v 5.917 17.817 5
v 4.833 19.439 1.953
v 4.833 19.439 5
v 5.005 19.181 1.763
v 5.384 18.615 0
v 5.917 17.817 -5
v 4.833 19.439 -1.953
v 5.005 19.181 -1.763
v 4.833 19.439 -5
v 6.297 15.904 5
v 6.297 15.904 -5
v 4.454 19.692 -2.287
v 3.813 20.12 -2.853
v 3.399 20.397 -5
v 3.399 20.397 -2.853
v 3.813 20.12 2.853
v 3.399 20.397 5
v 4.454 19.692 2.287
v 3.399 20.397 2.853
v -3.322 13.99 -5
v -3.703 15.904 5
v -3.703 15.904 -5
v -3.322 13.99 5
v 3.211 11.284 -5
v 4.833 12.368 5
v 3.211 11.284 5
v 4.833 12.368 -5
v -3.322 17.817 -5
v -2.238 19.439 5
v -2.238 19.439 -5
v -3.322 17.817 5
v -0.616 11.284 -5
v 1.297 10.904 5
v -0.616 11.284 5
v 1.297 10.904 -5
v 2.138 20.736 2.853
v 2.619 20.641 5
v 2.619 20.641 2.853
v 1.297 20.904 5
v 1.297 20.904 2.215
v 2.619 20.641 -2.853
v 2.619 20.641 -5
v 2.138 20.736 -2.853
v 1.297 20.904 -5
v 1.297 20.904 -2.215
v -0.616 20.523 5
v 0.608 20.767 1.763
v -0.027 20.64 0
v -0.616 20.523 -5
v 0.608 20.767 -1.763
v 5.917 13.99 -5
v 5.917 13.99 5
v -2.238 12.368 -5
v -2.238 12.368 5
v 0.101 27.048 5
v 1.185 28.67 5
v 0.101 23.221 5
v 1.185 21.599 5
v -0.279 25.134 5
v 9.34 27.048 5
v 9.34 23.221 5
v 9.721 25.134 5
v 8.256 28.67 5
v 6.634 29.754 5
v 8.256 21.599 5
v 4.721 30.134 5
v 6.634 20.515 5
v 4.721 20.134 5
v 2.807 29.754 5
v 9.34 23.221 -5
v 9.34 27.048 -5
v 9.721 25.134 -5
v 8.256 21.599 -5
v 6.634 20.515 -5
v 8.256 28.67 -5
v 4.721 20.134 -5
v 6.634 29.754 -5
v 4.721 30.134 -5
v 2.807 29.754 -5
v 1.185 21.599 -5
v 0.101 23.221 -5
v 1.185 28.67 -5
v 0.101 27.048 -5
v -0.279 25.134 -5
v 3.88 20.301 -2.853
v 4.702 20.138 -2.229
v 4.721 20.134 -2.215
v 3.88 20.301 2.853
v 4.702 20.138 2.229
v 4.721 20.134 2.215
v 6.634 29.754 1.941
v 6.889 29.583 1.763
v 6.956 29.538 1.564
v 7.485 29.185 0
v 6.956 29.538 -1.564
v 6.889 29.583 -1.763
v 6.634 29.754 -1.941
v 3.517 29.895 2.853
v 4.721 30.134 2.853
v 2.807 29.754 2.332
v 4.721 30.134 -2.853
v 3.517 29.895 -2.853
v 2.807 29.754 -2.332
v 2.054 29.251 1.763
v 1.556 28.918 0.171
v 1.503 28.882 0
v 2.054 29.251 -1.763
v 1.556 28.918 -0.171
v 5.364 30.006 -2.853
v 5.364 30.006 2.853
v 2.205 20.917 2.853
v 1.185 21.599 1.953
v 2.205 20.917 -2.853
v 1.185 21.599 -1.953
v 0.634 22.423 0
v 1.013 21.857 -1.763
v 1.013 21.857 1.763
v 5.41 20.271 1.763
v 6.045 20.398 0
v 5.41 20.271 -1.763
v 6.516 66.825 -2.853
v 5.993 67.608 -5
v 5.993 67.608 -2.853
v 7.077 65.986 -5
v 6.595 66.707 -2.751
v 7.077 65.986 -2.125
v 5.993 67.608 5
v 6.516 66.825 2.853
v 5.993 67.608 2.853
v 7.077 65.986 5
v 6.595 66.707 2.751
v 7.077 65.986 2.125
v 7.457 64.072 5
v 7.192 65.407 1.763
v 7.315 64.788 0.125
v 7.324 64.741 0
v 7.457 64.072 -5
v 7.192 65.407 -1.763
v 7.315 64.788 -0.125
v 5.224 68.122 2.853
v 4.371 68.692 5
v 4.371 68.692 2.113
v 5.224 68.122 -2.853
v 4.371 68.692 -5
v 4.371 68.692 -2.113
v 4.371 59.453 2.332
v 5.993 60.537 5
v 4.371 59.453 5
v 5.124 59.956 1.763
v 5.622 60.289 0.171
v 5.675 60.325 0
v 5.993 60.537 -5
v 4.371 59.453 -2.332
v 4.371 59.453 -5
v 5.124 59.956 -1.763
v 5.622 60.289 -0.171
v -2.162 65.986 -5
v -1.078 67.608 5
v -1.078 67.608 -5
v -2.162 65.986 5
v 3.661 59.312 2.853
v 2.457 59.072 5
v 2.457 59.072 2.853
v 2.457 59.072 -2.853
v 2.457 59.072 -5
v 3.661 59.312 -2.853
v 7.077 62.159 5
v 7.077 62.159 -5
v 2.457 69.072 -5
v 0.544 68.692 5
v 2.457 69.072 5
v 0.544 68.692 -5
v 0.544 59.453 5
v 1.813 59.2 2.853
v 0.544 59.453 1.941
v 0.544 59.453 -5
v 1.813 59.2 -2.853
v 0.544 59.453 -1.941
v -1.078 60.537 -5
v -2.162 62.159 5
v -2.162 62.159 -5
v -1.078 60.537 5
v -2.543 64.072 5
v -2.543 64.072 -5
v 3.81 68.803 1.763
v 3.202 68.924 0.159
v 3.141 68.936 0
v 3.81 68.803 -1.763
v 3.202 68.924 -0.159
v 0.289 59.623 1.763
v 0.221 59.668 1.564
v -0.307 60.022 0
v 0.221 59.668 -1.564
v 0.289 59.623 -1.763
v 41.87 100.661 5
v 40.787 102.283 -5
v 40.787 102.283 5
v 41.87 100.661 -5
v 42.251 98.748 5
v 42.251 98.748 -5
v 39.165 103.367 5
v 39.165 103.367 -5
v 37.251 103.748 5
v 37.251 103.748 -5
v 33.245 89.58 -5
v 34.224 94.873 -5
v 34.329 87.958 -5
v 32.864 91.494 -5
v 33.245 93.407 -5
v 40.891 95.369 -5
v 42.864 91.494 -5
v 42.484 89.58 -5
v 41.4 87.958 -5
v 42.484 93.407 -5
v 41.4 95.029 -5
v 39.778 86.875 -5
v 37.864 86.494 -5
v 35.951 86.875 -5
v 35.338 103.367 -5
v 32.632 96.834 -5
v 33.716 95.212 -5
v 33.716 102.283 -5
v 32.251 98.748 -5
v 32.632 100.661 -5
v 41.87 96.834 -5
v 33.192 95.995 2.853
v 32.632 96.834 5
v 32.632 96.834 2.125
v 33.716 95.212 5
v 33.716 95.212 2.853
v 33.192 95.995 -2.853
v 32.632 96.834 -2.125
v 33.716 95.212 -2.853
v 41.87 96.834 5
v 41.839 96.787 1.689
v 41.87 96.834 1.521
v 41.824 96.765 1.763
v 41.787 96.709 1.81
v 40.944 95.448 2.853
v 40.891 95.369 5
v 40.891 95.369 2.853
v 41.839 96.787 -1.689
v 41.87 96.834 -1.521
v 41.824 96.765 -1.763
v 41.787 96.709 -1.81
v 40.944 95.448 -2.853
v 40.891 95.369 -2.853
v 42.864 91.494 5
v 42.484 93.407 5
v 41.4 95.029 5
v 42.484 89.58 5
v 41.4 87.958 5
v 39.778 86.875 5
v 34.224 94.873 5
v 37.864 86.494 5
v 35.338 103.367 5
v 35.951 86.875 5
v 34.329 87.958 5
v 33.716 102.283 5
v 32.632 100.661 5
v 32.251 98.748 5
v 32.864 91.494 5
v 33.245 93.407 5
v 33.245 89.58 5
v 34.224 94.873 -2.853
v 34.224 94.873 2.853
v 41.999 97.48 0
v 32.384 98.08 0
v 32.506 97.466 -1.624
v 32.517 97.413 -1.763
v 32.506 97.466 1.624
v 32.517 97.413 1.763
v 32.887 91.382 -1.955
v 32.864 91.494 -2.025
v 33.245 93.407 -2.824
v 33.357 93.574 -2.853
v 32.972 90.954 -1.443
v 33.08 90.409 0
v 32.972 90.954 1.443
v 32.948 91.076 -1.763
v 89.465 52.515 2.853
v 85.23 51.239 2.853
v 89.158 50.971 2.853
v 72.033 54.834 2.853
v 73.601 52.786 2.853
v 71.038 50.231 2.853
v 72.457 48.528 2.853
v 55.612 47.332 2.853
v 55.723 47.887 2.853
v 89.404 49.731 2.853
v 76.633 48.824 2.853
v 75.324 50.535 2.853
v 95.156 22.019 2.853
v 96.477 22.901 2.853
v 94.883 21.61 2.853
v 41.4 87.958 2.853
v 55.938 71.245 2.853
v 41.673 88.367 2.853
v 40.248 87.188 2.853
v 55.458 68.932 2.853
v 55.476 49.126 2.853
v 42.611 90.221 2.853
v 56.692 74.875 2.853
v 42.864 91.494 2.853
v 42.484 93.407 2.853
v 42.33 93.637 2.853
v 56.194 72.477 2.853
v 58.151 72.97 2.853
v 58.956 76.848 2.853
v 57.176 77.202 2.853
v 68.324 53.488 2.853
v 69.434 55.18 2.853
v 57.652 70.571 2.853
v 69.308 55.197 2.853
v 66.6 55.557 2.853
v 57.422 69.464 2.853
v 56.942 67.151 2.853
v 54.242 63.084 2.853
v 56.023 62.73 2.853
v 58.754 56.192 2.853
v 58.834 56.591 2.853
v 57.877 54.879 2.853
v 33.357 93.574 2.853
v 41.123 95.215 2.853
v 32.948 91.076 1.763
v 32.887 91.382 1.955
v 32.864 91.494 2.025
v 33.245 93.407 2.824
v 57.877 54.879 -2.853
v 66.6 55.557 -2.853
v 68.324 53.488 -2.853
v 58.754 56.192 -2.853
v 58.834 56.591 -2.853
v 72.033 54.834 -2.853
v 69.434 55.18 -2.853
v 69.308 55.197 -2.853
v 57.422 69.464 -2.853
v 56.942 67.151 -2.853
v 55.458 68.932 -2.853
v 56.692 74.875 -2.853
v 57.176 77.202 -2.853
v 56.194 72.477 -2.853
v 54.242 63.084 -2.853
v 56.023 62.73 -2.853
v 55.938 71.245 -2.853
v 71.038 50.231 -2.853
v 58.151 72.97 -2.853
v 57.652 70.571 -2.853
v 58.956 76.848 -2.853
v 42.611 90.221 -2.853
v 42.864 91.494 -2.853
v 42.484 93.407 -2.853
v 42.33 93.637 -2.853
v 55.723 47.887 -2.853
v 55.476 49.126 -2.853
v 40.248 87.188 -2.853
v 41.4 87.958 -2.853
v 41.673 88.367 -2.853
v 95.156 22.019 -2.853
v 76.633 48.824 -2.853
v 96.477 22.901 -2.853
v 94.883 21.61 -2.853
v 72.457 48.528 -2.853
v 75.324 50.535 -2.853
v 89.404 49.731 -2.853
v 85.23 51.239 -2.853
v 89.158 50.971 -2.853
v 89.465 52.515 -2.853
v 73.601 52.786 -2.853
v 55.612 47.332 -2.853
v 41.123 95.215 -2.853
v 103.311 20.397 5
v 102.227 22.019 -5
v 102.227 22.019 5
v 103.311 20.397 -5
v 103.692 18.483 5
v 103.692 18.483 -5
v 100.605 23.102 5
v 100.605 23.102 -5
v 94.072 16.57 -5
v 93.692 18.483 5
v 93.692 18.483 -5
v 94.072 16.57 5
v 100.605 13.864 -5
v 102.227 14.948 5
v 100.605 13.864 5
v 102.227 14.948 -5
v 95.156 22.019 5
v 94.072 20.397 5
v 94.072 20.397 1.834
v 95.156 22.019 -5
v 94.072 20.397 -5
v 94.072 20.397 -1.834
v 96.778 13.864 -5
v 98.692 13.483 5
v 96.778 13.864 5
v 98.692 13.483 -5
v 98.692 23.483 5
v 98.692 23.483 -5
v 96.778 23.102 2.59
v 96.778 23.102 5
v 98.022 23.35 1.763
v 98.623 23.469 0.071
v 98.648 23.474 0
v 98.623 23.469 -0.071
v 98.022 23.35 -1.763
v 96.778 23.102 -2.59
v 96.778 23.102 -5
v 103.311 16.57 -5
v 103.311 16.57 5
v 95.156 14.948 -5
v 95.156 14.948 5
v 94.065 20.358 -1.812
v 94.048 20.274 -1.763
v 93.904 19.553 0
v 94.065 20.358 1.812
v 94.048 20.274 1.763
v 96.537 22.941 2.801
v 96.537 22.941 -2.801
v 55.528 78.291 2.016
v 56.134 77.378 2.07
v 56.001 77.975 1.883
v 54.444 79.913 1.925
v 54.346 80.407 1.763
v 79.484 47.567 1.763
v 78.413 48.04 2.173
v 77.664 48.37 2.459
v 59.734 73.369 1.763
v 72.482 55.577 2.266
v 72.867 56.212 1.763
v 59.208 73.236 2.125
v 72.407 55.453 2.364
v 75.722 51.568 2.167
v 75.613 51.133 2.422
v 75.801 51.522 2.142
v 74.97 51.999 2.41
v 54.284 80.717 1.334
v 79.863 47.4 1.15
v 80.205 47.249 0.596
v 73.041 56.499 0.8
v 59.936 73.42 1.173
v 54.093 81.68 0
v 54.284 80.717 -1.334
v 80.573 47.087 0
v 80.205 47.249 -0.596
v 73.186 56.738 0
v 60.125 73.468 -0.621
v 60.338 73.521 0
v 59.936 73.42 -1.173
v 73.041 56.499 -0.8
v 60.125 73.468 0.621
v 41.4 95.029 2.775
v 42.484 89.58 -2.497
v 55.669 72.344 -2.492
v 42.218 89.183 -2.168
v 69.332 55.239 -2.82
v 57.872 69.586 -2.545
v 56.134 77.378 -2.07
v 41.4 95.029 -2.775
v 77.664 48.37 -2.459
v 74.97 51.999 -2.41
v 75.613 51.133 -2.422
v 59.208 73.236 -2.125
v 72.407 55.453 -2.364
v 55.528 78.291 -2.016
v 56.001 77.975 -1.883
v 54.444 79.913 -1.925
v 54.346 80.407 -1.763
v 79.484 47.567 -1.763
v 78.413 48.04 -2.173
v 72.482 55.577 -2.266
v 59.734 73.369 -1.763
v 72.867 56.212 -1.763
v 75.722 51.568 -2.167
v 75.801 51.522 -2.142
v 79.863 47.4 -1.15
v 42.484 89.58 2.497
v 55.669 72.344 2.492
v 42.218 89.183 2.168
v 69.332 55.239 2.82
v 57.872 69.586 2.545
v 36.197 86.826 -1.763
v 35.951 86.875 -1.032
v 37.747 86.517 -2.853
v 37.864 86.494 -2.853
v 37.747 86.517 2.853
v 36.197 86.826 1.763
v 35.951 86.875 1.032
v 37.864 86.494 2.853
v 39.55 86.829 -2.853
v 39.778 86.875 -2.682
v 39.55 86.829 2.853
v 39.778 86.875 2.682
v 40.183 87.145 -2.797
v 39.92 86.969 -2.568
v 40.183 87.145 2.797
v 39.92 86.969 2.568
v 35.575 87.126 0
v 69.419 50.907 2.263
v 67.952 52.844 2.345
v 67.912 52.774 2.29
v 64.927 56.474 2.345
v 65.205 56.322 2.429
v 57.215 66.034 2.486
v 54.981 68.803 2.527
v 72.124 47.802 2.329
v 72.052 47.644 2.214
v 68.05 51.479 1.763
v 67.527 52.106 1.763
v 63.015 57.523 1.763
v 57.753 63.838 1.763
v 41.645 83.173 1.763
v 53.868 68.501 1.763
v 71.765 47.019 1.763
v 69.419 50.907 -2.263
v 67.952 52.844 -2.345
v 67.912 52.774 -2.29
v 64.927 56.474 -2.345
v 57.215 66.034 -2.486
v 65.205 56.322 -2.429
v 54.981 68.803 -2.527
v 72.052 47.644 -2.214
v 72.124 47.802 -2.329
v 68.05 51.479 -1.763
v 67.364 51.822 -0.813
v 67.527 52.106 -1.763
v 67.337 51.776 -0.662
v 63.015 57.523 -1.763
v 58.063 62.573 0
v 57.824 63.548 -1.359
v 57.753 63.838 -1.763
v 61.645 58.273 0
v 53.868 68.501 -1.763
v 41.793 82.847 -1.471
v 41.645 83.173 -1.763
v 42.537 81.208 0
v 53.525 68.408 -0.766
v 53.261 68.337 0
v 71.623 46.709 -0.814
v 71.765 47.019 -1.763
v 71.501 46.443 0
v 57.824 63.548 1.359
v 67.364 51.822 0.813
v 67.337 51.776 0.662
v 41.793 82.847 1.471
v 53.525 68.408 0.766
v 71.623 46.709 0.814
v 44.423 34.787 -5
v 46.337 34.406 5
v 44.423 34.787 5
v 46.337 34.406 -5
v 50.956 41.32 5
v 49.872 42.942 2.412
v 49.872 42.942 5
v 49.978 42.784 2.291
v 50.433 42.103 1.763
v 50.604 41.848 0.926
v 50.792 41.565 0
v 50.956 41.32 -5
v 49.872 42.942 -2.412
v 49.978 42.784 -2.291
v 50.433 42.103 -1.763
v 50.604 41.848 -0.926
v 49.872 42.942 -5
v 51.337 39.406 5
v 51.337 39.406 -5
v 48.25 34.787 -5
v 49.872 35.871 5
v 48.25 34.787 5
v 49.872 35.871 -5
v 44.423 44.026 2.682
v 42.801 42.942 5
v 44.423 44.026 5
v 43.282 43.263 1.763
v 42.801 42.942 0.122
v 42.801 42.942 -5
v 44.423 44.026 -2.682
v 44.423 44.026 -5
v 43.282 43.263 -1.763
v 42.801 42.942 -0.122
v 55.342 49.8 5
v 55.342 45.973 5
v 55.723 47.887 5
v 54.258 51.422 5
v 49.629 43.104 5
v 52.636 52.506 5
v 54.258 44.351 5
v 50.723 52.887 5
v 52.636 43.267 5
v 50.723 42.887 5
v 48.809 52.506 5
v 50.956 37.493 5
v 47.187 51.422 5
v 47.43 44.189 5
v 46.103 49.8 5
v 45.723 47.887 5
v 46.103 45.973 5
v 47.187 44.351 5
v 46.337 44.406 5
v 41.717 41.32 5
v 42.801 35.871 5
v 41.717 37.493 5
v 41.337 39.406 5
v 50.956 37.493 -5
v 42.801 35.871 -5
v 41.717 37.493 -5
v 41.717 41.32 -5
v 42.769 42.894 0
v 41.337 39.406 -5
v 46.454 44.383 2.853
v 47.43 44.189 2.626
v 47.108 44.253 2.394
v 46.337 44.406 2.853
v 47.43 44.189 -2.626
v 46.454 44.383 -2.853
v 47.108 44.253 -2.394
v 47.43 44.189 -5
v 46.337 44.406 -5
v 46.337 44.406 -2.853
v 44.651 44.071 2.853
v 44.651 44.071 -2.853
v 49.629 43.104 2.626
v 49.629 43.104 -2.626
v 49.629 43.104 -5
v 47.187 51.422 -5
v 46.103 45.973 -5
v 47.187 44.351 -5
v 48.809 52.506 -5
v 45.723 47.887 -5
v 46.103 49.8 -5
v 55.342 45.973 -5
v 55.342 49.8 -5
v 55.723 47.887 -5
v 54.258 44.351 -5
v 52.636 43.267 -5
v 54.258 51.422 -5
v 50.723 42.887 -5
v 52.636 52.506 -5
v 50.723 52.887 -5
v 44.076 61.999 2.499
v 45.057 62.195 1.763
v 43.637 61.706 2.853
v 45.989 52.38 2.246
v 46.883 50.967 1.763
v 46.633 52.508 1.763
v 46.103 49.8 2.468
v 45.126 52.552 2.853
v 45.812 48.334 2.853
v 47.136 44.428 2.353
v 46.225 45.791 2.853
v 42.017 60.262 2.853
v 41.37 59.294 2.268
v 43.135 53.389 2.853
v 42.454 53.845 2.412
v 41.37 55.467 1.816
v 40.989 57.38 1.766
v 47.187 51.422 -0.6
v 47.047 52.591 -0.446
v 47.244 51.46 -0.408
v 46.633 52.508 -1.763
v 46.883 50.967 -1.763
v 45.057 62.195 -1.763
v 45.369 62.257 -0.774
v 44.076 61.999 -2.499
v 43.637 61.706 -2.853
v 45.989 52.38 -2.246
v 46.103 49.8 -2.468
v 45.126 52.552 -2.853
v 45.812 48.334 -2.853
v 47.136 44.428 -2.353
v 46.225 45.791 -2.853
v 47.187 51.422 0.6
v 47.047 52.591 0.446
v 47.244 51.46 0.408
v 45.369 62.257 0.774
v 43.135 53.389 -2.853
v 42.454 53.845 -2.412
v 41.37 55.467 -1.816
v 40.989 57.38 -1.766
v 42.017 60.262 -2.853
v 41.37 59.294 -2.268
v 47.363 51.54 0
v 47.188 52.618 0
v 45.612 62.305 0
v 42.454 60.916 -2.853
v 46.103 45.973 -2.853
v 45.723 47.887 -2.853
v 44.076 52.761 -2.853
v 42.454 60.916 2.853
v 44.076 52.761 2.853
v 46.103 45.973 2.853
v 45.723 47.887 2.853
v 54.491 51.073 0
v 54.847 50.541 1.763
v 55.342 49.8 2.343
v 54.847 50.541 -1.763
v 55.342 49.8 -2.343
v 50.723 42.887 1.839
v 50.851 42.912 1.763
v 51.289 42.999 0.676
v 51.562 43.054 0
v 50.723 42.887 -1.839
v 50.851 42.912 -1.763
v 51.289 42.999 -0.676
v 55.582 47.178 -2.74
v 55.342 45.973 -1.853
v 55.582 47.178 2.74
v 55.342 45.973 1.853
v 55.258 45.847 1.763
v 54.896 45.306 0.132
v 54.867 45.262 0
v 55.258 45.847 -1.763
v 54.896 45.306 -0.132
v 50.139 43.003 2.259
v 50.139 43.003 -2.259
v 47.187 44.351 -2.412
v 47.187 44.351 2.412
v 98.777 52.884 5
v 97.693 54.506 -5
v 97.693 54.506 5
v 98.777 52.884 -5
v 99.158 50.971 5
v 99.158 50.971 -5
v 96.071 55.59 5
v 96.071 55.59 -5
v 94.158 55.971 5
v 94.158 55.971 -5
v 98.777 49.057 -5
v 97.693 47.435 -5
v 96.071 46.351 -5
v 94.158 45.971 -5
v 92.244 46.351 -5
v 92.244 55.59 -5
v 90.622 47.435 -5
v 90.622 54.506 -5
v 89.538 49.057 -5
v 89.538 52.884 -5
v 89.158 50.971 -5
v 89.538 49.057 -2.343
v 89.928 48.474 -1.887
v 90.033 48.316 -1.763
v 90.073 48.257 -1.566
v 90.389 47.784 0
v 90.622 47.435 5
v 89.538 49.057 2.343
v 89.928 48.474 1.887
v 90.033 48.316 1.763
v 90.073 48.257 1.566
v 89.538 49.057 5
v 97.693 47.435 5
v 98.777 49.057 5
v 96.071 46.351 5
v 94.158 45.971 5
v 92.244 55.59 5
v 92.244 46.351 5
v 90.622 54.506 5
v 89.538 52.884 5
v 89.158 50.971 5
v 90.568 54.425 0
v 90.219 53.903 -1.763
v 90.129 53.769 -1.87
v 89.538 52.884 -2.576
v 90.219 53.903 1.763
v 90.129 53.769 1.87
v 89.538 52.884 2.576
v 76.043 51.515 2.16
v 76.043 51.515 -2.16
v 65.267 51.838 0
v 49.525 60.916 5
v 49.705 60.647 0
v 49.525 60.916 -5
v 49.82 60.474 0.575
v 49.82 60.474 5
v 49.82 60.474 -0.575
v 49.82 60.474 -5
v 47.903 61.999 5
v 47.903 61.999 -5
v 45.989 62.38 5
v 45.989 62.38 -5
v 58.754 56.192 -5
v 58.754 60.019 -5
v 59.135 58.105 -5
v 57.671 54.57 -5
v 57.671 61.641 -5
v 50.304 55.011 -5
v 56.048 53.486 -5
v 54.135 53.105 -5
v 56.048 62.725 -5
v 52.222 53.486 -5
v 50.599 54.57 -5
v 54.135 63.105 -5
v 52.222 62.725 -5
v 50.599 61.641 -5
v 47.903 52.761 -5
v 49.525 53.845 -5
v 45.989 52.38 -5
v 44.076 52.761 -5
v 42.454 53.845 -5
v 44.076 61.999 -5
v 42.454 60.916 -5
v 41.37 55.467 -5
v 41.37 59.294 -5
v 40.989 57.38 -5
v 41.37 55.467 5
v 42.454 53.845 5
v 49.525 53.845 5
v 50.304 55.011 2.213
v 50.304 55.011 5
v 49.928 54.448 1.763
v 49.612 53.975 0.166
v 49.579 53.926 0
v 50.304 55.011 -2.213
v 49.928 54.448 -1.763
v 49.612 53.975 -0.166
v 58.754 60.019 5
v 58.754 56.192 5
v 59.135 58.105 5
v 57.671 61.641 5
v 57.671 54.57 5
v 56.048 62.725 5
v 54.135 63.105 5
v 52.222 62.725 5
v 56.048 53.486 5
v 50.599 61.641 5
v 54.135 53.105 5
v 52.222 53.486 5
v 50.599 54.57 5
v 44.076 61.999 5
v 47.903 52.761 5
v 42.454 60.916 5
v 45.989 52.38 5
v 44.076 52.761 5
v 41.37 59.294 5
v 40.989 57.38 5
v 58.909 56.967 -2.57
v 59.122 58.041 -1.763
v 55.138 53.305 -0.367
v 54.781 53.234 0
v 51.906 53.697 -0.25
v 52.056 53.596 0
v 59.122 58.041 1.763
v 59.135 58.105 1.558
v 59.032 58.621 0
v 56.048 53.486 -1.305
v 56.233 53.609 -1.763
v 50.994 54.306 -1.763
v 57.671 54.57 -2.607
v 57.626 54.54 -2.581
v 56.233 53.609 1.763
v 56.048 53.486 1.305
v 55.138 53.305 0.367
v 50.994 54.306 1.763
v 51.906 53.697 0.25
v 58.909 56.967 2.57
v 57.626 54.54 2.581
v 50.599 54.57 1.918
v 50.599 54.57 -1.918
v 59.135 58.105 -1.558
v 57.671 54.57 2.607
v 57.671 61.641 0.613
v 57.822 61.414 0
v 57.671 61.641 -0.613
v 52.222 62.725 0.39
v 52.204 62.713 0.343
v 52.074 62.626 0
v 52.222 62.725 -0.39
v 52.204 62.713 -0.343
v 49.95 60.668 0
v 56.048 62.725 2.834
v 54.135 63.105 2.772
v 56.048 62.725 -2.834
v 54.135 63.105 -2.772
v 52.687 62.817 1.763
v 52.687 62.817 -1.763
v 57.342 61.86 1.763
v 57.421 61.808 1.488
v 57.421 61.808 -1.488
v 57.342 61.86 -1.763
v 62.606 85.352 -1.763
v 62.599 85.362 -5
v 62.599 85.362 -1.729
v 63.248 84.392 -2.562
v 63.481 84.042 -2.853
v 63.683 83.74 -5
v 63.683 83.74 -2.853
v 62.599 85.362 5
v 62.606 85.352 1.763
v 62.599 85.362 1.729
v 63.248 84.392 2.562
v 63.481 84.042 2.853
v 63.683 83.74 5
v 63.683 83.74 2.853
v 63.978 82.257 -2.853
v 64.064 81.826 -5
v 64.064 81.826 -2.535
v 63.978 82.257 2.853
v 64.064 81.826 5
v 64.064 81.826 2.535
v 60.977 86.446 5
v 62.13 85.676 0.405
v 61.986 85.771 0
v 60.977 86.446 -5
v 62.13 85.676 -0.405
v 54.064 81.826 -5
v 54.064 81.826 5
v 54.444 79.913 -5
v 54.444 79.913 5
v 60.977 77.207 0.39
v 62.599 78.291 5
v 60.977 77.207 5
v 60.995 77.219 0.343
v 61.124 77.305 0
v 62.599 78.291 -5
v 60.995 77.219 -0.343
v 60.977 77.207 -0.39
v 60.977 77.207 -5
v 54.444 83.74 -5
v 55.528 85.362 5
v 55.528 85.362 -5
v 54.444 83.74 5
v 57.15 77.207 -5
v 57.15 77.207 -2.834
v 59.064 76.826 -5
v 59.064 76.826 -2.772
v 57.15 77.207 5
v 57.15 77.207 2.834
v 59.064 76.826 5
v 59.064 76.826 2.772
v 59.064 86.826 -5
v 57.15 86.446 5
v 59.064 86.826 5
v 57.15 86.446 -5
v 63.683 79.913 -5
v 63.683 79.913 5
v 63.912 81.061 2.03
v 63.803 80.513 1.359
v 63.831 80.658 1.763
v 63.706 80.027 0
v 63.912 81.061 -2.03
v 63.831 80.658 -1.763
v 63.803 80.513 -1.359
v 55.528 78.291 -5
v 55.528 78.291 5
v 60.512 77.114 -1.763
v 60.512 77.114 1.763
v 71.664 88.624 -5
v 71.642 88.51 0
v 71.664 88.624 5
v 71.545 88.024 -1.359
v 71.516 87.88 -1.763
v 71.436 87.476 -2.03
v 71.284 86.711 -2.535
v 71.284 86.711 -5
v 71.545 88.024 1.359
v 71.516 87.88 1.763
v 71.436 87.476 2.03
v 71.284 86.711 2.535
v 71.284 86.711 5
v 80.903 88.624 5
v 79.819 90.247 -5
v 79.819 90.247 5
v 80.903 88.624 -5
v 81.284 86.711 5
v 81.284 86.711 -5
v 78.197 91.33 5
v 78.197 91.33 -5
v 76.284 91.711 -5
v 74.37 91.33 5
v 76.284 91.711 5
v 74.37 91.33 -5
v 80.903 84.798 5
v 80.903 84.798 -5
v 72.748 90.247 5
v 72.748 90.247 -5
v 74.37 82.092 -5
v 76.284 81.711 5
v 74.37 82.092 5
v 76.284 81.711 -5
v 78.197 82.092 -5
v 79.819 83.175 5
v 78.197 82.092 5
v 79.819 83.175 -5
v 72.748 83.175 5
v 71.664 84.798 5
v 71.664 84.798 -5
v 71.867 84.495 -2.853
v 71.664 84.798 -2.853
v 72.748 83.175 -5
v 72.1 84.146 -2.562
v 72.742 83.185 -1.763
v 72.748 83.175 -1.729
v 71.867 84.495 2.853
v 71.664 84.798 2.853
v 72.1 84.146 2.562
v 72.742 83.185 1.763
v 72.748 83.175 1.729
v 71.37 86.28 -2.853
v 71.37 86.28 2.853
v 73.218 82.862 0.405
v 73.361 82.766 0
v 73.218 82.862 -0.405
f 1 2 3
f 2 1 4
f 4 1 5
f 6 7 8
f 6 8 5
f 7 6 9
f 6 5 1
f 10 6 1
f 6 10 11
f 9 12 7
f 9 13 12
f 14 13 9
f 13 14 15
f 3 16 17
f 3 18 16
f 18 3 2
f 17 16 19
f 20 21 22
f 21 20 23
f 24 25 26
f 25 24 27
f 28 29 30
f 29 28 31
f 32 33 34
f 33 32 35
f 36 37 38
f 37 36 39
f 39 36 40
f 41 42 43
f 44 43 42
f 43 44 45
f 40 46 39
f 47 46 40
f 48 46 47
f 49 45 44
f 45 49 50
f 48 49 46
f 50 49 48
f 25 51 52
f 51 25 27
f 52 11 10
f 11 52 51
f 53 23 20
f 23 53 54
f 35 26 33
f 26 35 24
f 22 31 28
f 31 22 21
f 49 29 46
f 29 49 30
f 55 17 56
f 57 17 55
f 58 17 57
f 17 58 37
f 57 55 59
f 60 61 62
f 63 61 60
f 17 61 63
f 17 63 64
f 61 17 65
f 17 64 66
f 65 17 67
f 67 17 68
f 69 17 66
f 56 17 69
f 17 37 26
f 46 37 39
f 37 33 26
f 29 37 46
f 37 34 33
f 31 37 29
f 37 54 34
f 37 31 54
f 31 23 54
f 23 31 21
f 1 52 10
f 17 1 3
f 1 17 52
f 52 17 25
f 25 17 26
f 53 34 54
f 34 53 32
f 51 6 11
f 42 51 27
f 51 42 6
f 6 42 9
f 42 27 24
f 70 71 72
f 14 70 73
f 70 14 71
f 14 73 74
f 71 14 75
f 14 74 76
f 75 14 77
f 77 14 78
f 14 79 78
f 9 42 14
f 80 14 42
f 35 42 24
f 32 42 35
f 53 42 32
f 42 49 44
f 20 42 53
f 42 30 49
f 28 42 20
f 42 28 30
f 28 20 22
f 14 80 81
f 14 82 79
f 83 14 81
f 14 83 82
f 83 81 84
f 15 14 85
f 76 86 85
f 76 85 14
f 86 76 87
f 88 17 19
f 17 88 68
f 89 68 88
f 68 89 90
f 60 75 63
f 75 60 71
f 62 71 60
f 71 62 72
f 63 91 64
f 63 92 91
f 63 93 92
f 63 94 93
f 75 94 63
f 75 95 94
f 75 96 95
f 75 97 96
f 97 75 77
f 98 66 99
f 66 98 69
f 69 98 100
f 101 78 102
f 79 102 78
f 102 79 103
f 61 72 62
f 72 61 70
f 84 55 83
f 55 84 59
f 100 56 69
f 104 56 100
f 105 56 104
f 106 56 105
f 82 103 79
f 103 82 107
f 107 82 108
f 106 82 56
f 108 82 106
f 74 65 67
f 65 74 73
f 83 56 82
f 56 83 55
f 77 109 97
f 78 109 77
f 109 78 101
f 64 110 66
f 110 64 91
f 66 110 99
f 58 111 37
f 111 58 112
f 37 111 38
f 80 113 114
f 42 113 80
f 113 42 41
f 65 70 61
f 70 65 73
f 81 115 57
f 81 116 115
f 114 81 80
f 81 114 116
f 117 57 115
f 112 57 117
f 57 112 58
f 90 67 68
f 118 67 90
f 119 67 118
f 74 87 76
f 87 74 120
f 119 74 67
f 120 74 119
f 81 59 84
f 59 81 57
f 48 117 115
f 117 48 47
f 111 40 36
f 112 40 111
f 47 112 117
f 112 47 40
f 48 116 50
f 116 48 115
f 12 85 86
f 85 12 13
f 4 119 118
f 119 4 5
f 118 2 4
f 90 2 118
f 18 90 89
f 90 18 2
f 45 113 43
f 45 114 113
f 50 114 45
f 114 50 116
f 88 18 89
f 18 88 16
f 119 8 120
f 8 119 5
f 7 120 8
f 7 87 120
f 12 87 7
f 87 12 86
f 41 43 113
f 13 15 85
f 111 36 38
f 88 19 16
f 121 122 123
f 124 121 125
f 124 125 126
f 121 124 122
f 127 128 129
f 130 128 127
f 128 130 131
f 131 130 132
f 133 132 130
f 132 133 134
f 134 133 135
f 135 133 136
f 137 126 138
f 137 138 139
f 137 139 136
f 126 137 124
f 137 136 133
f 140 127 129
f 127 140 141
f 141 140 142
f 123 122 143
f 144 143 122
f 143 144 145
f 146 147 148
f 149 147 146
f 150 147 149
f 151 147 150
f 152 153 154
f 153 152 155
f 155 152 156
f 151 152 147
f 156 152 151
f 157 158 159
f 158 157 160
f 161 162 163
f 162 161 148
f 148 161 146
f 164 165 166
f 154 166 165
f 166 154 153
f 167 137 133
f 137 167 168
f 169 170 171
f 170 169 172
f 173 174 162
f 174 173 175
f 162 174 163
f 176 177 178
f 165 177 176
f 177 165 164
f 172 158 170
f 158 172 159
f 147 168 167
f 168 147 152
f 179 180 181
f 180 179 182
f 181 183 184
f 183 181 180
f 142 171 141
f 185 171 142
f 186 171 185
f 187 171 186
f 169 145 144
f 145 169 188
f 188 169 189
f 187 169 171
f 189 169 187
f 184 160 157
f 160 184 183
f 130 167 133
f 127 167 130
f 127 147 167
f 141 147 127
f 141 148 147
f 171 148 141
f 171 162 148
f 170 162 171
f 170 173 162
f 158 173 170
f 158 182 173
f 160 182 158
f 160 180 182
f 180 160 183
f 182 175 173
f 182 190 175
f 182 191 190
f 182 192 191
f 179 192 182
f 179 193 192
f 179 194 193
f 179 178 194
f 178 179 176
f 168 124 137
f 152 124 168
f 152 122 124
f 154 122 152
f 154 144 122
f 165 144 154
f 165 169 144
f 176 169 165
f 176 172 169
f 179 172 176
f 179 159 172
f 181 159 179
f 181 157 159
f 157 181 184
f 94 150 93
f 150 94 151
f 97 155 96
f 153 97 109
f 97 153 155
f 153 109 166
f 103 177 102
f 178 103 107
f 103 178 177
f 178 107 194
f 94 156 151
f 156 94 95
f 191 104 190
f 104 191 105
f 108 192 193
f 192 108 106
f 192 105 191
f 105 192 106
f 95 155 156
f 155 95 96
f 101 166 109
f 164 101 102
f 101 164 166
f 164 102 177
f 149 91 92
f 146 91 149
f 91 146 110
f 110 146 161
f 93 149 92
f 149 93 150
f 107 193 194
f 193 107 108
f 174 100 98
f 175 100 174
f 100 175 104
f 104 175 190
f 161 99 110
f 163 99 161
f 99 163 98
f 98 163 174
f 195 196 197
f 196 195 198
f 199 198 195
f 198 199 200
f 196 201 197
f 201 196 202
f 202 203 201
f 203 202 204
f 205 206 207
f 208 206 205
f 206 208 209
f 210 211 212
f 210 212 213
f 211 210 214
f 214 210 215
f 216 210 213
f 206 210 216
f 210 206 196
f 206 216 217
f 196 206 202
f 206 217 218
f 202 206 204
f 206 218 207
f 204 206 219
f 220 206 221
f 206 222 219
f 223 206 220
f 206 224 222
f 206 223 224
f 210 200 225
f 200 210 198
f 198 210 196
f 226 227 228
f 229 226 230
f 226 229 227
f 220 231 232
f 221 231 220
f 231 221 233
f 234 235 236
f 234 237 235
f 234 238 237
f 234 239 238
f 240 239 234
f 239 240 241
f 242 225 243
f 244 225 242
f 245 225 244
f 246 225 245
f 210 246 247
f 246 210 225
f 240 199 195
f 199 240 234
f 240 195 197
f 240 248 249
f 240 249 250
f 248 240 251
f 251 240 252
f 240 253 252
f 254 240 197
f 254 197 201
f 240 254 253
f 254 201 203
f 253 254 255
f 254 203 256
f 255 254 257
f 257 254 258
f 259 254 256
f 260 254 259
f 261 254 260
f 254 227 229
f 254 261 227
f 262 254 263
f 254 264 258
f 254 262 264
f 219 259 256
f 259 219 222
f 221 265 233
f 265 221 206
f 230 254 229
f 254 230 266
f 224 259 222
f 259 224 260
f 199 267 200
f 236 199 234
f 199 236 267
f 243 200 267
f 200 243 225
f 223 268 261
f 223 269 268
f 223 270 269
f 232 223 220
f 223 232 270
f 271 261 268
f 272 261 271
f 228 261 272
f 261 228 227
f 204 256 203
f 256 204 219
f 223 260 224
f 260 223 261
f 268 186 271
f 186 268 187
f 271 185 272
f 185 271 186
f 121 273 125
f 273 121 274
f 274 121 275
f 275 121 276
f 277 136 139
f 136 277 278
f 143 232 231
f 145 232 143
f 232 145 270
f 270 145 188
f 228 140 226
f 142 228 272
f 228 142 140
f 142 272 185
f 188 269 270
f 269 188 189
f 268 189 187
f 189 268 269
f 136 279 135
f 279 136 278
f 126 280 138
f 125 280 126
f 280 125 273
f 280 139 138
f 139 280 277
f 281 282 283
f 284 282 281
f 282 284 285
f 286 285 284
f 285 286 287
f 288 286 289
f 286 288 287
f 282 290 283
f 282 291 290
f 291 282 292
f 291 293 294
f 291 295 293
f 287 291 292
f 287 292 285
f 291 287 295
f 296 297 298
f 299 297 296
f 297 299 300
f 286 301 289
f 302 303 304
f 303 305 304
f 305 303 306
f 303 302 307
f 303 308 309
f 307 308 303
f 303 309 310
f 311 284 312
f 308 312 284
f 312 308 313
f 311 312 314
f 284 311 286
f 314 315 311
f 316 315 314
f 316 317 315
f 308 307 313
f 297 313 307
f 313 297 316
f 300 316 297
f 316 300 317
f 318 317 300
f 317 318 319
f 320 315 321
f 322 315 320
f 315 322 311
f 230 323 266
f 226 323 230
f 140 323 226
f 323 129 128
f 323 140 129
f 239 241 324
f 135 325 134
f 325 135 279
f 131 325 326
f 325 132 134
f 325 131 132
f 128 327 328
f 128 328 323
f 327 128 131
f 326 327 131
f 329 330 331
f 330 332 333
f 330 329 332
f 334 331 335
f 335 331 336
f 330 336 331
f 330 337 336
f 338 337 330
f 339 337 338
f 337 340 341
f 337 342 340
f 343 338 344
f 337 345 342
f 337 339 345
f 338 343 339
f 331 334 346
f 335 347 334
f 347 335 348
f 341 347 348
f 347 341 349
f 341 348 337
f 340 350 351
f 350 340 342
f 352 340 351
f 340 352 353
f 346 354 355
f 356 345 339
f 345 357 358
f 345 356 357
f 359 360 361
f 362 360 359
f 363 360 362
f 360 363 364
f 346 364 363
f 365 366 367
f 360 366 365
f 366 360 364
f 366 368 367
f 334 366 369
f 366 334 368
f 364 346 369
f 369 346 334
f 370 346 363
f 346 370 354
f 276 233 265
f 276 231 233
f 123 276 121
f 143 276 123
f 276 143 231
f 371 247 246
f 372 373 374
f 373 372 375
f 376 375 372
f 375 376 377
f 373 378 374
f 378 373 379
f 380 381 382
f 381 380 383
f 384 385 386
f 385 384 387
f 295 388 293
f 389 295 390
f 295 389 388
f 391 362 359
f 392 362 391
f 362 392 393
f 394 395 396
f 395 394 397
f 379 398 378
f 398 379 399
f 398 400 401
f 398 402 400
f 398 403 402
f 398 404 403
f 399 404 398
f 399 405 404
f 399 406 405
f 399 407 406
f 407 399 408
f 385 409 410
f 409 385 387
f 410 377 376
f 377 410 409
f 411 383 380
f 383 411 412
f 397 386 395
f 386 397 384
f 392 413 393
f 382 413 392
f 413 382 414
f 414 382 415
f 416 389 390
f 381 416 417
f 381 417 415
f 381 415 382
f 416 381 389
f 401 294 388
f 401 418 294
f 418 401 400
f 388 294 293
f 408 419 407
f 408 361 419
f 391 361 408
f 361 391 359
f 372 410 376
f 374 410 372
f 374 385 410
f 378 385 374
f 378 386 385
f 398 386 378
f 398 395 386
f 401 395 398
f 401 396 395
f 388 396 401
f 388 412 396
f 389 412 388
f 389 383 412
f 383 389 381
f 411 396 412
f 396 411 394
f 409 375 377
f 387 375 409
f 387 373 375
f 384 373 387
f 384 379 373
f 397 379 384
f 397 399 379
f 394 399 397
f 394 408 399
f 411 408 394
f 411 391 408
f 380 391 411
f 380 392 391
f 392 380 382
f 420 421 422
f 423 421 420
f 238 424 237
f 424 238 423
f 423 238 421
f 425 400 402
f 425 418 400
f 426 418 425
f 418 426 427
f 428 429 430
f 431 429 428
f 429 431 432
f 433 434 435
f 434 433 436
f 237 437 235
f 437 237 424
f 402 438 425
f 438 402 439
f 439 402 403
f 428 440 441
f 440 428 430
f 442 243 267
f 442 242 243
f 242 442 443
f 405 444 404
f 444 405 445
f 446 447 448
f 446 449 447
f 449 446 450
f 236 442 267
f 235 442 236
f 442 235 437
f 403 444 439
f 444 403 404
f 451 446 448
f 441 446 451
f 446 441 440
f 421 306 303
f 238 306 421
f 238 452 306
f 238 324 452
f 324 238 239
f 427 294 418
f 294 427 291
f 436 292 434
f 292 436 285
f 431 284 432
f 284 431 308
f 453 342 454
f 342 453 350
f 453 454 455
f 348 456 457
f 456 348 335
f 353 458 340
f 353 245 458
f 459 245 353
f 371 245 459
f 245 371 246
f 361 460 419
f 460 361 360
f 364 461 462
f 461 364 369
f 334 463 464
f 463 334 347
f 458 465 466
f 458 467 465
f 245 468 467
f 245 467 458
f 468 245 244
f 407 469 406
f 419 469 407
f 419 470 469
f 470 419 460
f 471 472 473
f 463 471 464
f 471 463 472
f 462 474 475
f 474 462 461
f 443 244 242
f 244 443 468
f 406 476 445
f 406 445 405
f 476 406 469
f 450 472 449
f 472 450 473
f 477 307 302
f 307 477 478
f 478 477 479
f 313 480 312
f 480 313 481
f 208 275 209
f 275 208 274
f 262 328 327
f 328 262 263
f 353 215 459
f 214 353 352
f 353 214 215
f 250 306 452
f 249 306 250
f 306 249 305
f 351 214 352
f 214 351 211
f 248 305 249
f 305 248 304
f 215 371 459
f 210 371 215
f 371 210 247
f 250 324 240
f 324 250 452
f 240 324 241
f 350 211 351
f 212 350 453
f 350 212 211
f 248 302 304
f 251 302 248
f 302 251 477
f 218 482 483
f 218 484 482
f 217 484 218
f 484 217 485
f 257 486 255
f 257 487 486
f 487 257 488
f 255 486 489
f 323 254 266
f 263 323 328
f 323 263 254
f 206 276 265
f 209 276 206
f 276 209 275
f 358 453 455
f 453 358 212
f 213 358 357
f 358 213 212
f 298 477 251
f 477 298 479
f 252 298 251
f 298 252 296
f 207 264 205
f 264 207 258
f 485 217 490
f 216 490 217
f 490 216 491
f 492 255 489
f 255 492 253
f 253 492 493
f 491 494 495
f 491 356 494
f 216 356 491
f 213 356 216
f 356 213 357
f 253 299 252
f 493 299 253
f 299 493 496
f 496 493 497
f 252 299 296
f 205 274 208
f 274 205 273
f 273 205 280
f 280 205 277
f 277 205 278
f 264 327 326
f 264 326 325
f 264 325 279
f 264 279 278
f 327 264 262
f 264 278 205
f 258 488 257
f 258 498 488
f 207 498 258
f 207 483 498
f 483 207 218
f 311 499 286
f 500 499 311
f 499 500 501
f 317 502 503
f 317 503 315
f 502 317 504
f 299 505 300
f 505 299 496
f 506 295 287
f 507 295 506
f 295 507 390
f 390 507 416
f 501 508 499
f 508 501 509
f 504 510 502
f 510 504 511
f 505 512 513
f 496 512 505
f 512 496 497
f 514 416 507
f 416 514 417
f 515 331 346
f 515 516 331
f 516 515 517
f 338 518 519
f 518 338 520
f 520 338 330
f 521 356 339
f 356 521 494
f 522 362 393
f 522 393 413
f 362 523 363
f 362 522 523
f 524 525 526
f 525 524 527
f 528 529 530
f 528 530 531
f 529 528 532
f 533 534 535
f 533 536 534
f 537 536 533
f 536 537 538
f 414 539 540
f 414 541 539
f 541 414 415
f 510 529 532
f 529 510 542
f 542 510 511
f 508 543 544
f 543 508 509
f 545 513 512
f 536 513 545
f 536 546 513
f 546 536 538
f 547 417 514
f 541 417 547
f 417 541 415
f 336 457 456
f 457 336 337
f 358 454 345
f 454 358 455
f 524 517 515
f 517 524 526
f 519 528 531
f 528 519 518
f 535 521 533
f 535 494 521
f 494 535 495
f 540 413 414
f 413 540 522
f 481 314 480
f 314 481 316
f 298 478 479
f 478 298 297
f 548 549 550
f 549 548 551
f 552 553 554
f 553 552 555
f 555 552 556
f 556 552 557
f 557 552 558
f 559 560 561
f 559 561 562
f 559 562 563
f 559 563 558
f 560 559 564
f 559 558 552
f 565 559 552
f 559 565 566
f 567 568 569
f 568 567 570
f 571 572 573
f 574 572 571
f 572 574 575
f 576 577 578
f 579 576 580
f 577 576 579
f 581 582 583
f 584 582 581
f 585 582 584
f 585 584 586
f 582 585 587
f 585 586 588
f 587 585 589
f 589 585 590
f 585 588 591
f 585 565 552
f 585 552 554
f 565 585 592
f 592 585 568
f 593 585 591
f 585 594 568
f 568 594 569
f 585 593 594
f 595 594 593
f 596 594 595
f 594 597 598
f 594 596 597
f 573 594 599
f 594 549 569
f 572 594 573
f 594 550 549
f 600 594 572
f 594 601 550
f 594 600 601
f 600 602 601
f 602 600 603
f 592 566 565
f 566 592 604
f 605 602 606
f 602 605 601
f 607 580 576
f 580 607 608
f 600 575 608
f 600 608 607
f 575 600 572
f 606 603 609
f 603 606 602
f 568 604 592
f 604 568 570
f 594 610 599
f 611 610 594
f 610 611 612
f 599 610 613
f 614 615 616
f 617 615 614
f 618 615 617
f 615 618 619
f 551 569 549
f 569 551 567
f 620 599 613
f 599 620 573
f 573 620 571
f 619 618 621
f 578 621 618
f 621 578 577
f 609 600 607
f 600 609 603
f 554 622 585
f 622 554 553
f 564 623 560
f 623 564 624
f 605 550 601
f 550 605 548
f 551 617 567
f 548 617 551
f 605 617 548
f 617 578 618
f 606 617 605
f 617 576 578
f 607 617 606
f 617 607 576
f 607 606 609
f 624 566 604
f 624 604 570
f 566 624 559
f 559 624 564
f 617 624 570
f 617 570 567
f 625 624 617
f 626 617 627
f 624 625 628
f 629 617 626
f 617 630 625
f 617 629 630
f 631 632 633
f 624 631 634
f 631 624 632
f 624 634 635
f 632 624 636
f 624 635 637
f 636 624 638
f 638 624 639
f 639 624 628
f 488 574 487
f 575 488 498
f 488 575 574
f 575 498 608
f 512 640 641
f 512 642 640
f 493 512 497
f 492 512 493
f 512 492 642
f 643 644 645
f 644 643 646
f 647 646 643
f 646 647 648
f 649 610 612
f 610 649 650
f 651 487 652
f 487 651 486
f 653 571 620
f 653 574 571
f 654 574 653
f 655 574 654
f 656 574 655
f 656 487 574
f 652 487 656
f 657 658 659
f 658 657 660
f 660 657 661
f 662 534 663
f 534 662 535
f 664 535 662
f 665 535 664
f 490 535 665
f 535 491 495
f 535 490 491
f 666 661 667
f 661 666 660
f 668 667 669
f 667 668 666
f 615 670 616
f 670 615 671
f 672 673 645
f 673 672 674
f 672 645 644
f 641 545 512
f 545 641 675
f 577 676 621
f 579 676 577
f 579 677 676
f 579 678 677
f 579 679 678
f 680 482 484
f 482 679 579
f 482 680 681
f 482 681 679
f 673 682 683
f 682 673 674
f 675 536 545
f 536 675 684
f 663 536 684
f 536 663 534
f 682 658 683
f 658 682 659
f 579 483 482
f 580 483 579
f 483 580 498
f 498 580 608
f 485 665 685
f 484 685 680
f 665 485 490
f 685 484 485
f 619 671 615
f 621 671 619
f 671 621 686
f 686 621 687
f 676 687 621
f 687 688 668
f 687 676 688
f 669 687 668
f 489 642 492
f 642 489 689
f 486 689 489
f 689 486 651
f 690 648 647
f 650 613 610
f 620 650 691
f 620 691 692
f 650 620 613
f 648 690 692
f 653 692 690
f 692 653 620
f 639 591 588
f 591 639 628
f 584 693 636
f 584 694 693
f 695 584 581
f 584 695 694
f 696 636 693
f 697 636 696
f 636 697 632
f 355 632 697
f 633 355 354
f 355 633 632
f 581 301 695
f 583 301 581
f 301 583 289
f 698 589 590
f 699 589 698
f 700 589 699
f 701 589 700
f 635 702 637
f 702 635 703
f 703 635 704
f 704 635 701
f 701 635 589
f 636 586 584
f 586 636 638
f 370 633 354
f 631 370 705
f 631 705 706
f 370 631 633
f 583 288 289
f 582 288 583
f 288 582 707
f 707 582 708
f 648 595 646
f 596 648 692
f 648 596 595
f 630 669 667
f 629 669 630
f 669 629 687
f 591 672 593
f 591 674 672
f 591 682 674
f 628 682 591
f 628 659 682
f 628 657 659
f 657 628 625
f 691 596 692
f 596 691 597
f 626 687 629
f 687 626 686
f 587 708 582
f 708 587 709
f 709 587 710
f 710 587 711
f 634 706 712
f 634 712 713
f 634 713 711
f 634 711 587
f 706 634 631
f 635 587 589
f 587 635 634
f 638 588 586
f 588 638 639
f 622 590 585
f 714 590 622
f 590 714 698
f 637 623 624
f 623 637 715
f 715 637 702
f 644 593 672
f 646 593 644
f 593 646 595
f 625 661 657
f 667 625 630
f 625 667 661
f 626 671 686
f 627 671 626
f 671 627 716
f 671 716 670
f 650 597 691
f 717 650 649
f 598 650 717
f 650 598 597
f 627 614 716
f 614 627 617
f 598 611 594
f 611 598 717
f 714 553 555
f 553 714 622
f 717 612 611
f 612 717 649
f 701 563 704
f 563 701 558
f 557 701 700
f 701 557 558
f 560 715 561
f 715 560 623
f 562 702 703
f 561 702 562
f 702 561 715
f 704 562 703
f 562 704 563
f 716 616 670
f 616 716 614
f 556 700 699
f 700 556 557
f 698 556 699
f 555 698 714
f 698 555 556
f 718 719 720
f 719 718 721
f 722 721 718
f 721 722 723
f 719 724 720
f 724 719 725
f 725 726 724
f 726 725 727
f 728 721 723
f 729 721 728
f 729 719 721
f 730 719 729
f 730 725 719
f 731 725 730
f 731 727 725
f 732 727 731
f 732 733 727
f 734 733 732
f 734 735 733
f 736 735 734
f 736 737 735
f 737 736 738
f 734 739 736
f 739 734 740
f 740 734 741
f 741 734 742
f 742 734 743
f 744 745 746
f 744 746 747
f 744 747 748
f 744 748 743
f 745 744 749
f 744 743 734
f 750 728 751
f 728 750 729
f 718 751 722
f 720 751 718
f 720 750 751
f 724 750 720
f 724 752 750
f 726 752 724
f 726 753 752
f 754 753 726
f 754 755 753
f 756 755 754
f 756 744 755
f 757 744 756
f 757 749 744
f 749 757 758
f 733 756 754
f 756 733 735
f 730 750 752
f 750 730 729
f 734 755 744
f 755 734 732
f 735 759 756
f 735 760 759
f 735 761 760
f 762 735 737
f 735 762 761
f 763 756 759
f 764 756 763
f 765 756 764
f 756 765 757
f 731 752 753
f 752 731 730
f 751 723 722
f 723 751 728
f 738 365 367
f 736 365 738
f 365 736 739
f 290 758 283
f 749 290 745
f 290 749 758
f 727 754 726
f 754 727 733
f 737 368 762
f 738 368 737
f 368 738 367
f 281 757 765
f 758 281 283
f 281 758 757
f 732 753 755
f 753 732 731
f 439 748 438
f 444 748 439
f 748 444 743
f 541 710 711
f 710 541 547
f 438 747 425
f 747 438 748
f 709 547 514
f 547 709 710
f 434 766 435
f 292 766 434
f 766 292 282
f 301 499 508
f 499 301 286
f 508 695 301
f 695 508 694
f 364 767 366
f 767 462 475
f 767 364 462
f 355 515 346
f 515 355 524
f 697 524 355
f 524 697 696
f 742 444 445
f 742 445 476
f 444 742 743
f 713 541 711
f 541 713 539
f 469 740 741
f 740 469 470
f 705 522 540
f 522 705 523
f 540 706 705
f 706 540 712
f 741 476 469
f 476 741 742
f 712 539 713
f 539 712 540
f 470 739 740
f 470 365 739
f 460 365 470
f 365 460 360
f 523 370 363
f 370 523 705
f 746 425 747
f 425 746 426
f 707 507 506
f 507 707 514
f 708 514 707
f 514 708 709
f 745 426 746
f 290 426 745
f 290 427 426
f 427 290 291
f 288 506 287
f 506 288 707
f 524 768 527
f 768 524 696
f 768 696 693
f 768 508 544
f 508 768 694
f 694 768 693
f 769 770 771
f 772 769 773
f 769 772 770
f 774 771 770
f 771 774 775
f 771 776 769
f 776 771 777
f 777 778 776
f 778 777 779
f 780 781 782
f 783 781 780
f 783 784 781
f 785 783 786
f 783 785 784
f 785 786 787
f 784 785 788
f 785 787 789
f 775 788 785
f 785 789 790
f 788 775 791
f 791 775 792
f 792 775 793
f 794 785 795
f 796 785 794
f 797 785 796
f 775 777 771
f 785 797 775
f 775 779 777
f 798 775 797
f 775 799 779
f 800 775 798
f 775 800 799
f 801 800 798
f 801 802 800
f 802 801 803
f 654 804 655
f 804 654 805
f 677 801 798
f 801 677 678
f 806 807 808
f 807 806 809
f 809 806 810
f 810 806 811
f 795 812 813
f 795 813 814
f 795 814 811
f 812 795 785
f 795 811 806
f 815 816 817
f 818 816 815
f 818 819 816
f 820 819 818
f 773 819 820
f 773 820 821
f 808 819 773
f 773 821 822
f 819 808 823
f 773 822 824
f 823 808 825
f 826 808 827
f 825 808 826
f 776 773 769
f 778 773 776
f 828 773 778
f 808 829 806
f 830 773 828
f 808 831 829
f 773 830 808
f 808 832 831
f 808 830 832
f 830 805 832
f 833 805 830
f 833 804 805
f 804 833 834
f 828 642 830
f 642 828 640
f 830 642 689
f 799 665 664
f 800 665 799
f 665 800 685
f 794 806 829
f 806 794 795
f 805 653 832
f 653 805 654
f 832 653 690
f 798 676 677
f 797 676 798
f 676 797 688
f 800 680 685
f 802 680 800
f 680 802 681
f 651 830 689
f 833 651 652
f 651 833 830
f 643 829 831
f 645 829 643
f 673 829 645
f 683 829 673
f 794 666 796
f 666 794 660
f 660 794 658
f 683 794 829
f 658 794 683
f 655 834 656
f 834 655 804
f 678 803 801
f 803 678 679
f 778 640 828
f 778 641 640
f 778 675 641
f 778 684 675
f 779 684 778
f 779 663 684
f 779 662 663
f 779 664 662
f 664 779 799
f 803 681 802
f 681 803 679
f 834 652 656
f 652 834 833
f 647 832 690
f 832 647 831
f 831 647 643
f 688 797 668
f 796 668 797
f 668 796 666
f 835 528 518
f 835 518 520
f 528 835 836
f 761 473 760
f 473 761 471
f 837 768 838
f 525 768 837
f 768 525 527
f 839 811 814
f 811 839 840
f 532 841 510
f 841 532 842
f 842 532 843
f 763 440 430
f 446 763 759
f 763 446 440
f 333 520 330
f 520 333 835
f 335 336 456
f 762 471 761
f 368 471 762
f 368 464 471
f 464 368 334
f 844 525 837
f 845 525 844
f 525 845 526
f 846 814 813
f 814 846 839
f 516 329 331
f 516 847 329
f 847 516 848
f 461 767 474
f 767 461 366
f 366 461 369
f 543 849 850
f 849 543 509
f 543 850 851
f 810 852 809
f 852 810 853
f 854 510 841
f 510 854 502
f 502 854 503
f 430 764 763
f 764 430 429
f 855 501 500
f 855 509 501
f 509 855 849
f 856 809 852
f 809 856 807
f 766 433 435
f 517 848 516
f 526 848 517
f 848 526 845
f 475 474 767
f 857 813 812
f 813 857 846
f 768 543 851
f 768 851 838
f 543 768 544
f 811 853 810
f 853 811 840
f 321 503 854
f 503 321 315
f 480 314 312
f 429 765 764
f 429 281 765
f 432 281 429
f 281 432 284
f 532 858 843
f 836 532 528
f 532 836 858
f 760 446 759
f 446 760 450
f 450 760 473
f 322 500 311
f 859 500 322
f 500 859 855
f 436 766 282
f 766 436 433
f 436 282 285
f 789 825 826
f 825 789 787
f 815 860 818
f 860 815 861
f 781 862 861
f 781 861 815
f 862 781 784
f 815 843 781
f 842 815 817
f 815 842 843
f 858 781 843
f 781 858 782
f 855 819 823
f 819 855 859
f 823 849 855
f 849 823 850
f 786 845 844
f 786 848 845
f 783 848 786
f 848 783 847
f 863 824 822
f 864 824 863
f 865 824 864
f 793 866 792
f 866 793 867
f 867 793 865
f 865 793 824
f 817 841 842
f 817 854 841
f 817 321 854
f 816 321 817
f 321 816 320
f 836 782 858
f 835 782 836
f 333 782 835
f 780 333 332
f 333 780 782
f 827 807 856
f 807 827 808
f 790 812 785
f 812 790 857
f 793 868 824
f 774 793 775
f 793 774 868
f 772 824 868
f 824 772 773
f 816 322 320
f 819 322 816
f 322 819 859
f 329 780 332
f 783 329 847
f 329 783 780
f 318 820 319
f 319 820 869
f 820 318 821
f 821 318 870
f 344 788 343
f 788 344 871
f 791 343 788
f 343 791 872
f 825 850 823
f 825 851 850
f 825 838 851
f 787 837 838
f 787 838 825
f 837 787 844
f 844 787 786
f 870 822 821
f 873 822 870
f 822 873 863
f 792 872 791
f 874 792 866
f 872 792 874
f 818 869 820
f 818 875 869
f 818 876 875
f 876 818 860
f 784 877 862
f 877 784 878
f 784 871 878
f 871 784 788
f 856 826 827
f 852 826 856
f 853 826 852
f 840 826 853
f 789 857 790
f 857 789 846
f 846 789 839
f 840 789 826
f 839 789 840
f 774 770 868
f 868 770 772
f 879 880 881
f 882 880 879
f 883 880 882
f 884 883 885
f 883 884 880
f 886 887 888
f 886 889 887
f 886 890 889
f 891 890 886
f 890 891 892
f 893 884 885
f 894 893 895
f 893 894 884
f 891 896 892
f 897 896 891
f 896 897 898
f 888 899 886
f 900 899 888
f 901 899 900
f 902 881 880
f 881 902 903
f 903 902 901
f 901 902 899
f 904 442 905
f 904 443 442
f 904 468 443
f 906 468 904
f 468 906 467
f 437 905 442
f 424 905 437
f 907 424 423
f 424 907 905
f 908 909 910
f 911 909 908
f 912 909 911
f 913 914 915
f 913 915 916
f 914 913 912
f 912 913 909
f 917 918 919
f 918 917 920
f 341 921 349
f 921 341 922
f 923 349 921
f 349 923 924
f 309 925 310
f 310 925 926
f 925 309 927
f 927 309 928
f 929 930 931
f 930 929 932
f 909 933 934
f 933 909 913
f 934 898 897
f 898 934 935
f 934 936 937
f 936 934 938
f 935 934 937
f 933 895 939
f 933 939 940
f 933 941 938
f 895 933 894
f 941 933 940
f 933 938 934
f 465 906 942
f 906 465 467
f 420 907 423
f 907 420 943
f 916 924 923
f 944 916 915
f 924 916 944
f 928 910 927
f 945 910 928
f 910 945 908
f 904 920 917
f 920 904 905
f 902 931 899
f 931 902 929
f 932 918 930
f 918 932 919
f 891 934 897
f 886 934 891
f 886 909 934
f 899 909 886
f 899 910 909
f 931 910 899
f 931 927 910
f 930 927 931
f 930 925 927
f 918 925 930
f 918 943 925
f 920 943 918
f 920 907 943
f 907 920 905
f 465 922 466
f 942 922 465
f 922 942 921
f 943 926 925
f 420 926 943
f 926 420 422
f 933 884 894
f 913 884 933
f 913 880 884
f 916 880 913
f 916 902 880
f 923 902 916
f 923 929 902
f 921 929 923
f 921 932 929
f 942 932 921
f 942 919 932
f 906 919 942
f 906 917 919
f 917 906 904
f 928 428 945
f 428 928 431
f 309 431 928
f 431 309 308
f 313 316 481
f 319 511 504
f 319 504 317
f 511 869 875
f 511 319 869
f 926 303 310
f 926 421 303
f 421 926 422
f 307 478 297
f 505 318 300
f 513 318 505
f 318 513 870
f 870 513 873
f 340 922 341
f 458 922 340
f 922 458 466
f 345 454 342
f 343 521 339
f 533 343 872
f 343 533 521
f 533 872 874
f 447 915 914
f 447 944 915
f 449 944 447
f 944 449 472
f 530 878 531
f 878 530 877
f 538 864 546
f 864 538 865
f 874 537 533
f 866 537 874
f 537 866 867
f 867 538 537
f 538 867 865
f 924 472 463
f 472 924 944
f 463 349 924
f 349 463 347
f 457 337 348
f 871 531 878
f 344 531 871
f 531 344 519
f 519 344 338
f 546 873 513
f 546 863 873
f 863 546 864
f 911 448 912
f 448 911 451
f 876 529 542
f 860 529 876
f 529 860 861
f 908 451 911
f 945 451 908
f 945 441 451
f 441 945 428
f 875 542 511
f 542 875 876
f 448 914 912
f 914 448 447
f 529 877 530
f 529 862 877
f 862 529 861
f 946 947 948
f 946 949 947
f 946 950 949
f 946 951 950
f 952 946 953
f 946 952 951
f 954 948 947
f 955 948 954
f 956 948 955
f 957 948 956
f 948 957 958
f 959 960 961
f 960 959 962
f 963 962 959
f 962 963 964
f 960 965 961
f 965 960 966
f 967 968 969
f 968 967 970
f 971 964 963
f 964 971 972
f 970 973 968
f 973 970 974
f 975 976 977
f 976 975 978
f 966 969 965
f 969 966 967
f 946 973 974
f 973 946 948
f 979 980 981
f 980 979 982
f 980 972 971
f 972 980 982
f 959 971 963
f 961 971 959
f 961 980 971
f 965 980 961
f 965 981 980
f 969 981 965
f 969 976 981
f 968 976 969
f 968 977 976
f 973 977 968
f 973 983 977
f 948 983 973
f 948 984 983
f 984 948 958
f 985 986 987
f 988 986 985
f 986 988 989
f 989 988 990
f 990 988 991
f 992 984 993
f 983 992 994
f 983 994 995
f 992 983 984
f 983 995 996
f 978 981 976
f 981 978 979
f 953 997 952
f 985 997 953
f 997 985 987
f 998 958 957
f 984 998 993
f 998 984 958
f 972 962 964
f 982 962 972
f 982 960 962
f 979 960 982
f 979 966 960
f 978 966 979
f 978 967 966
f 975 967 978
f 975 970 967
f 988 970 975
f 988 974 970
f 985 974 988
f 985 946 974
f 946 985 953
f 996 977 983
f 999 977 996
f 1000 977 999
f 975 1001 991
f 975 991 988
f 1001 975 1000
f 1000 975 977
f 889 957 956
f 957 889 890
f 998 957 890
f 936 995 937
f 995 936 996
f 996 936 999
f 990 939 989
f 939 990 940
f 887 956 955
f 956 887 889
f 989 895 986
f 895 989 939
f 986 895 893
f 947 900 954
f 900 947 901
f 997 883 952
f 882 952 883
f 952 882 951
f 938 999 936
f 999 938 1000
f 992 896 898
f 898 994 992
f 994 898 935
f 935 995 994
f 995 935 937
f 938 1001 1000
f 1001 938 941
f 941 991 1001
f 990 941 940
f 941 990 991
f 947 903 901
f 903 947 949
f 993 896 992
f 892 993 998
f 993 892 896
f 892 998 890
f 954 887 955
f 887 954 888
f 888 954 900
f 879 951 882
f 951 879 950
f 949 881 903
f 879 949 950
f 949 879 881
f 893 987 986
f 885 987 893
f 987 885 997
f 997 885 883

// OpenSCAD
 
    

//pipe=function(acc,e,i,arr) is_function(e)?e(acc):acc;
//find=function(lookfor,match=function(a,b) a==b)   
//    function(acc,e,i,arr) match(e,lookfor)?concat(acc,[i]):acc; 
//min=function(acc,e,i,arr) ( is_undef(acc) || e < acc ) ? e : acc;
//
//slice=function(low,high) function(acc,e,i,arr) i>=low&&i<high?concat(acc,e):acc;
//
//
//equals=function(a,b) a==b;
//lessoreq=function(a,b) a<=b;
//within=function(v) function(a,b) lessoreq(abs(a-b),v); 
//add=function(a,b) is_undef(b)?a:a+b;
//addtax=function(a) a*1.15; 


////recucers
specialsort1=function(acc,e,i,arr) 
[
    each [for(n=acc)if( !(n.x>e.x || n.y>e.y ))n],
    e,
    each [for(n=acc)if( n.x>e.x || n.y>e.y )n]
    ];
specialsort2=function(acc,e,i,arr) 
[
    each [for(n=acc)if( !(n.x+ n.y>e.x+e.y ))n],
    e,
    each [for(n=acc)if( (n.x+ n.y>e.x+e.y ) )n]
    ];
    
function reduce(l,initalvalue,reducer,i=0) =
i >= len(l) ? initalvalue
       : reduce(l,reducer(acc= initalvalue,e=l[i],i=i,arr=l ),reducer,i+1);
    
    
 
//set=[for([0:12])rands(0,100,2)];
set=[[1.29735, 15.9036], [4.7206, 25.1342], [46.3367, 39.4064], [50.7228, 47.8867], [2.45735, 64.0724], [45.9894, 57.3801], [54.135, 58.1053], [59.0638, 81.8263], [76.2838, 86.711], [94.1577, 50.9707], [37.8645, 91.4939], [98.6917, 18.4831], [37.2511, 98.7479]];
    
    
    set2=reduce(set,[], specialsort1 );

    l=reduce(set,[], specialsort1 );


echo(l);
for (i=[0:len(l)-2]){
    translate(l[i]) cylinder(10,5,5,center=true);
    translate(l[i+1]) cylinder(10,5,5,center=true);
hull(){ translate(l[i]) sphere(3); translate(l[i+1]) sphere(3); }}
 
 
